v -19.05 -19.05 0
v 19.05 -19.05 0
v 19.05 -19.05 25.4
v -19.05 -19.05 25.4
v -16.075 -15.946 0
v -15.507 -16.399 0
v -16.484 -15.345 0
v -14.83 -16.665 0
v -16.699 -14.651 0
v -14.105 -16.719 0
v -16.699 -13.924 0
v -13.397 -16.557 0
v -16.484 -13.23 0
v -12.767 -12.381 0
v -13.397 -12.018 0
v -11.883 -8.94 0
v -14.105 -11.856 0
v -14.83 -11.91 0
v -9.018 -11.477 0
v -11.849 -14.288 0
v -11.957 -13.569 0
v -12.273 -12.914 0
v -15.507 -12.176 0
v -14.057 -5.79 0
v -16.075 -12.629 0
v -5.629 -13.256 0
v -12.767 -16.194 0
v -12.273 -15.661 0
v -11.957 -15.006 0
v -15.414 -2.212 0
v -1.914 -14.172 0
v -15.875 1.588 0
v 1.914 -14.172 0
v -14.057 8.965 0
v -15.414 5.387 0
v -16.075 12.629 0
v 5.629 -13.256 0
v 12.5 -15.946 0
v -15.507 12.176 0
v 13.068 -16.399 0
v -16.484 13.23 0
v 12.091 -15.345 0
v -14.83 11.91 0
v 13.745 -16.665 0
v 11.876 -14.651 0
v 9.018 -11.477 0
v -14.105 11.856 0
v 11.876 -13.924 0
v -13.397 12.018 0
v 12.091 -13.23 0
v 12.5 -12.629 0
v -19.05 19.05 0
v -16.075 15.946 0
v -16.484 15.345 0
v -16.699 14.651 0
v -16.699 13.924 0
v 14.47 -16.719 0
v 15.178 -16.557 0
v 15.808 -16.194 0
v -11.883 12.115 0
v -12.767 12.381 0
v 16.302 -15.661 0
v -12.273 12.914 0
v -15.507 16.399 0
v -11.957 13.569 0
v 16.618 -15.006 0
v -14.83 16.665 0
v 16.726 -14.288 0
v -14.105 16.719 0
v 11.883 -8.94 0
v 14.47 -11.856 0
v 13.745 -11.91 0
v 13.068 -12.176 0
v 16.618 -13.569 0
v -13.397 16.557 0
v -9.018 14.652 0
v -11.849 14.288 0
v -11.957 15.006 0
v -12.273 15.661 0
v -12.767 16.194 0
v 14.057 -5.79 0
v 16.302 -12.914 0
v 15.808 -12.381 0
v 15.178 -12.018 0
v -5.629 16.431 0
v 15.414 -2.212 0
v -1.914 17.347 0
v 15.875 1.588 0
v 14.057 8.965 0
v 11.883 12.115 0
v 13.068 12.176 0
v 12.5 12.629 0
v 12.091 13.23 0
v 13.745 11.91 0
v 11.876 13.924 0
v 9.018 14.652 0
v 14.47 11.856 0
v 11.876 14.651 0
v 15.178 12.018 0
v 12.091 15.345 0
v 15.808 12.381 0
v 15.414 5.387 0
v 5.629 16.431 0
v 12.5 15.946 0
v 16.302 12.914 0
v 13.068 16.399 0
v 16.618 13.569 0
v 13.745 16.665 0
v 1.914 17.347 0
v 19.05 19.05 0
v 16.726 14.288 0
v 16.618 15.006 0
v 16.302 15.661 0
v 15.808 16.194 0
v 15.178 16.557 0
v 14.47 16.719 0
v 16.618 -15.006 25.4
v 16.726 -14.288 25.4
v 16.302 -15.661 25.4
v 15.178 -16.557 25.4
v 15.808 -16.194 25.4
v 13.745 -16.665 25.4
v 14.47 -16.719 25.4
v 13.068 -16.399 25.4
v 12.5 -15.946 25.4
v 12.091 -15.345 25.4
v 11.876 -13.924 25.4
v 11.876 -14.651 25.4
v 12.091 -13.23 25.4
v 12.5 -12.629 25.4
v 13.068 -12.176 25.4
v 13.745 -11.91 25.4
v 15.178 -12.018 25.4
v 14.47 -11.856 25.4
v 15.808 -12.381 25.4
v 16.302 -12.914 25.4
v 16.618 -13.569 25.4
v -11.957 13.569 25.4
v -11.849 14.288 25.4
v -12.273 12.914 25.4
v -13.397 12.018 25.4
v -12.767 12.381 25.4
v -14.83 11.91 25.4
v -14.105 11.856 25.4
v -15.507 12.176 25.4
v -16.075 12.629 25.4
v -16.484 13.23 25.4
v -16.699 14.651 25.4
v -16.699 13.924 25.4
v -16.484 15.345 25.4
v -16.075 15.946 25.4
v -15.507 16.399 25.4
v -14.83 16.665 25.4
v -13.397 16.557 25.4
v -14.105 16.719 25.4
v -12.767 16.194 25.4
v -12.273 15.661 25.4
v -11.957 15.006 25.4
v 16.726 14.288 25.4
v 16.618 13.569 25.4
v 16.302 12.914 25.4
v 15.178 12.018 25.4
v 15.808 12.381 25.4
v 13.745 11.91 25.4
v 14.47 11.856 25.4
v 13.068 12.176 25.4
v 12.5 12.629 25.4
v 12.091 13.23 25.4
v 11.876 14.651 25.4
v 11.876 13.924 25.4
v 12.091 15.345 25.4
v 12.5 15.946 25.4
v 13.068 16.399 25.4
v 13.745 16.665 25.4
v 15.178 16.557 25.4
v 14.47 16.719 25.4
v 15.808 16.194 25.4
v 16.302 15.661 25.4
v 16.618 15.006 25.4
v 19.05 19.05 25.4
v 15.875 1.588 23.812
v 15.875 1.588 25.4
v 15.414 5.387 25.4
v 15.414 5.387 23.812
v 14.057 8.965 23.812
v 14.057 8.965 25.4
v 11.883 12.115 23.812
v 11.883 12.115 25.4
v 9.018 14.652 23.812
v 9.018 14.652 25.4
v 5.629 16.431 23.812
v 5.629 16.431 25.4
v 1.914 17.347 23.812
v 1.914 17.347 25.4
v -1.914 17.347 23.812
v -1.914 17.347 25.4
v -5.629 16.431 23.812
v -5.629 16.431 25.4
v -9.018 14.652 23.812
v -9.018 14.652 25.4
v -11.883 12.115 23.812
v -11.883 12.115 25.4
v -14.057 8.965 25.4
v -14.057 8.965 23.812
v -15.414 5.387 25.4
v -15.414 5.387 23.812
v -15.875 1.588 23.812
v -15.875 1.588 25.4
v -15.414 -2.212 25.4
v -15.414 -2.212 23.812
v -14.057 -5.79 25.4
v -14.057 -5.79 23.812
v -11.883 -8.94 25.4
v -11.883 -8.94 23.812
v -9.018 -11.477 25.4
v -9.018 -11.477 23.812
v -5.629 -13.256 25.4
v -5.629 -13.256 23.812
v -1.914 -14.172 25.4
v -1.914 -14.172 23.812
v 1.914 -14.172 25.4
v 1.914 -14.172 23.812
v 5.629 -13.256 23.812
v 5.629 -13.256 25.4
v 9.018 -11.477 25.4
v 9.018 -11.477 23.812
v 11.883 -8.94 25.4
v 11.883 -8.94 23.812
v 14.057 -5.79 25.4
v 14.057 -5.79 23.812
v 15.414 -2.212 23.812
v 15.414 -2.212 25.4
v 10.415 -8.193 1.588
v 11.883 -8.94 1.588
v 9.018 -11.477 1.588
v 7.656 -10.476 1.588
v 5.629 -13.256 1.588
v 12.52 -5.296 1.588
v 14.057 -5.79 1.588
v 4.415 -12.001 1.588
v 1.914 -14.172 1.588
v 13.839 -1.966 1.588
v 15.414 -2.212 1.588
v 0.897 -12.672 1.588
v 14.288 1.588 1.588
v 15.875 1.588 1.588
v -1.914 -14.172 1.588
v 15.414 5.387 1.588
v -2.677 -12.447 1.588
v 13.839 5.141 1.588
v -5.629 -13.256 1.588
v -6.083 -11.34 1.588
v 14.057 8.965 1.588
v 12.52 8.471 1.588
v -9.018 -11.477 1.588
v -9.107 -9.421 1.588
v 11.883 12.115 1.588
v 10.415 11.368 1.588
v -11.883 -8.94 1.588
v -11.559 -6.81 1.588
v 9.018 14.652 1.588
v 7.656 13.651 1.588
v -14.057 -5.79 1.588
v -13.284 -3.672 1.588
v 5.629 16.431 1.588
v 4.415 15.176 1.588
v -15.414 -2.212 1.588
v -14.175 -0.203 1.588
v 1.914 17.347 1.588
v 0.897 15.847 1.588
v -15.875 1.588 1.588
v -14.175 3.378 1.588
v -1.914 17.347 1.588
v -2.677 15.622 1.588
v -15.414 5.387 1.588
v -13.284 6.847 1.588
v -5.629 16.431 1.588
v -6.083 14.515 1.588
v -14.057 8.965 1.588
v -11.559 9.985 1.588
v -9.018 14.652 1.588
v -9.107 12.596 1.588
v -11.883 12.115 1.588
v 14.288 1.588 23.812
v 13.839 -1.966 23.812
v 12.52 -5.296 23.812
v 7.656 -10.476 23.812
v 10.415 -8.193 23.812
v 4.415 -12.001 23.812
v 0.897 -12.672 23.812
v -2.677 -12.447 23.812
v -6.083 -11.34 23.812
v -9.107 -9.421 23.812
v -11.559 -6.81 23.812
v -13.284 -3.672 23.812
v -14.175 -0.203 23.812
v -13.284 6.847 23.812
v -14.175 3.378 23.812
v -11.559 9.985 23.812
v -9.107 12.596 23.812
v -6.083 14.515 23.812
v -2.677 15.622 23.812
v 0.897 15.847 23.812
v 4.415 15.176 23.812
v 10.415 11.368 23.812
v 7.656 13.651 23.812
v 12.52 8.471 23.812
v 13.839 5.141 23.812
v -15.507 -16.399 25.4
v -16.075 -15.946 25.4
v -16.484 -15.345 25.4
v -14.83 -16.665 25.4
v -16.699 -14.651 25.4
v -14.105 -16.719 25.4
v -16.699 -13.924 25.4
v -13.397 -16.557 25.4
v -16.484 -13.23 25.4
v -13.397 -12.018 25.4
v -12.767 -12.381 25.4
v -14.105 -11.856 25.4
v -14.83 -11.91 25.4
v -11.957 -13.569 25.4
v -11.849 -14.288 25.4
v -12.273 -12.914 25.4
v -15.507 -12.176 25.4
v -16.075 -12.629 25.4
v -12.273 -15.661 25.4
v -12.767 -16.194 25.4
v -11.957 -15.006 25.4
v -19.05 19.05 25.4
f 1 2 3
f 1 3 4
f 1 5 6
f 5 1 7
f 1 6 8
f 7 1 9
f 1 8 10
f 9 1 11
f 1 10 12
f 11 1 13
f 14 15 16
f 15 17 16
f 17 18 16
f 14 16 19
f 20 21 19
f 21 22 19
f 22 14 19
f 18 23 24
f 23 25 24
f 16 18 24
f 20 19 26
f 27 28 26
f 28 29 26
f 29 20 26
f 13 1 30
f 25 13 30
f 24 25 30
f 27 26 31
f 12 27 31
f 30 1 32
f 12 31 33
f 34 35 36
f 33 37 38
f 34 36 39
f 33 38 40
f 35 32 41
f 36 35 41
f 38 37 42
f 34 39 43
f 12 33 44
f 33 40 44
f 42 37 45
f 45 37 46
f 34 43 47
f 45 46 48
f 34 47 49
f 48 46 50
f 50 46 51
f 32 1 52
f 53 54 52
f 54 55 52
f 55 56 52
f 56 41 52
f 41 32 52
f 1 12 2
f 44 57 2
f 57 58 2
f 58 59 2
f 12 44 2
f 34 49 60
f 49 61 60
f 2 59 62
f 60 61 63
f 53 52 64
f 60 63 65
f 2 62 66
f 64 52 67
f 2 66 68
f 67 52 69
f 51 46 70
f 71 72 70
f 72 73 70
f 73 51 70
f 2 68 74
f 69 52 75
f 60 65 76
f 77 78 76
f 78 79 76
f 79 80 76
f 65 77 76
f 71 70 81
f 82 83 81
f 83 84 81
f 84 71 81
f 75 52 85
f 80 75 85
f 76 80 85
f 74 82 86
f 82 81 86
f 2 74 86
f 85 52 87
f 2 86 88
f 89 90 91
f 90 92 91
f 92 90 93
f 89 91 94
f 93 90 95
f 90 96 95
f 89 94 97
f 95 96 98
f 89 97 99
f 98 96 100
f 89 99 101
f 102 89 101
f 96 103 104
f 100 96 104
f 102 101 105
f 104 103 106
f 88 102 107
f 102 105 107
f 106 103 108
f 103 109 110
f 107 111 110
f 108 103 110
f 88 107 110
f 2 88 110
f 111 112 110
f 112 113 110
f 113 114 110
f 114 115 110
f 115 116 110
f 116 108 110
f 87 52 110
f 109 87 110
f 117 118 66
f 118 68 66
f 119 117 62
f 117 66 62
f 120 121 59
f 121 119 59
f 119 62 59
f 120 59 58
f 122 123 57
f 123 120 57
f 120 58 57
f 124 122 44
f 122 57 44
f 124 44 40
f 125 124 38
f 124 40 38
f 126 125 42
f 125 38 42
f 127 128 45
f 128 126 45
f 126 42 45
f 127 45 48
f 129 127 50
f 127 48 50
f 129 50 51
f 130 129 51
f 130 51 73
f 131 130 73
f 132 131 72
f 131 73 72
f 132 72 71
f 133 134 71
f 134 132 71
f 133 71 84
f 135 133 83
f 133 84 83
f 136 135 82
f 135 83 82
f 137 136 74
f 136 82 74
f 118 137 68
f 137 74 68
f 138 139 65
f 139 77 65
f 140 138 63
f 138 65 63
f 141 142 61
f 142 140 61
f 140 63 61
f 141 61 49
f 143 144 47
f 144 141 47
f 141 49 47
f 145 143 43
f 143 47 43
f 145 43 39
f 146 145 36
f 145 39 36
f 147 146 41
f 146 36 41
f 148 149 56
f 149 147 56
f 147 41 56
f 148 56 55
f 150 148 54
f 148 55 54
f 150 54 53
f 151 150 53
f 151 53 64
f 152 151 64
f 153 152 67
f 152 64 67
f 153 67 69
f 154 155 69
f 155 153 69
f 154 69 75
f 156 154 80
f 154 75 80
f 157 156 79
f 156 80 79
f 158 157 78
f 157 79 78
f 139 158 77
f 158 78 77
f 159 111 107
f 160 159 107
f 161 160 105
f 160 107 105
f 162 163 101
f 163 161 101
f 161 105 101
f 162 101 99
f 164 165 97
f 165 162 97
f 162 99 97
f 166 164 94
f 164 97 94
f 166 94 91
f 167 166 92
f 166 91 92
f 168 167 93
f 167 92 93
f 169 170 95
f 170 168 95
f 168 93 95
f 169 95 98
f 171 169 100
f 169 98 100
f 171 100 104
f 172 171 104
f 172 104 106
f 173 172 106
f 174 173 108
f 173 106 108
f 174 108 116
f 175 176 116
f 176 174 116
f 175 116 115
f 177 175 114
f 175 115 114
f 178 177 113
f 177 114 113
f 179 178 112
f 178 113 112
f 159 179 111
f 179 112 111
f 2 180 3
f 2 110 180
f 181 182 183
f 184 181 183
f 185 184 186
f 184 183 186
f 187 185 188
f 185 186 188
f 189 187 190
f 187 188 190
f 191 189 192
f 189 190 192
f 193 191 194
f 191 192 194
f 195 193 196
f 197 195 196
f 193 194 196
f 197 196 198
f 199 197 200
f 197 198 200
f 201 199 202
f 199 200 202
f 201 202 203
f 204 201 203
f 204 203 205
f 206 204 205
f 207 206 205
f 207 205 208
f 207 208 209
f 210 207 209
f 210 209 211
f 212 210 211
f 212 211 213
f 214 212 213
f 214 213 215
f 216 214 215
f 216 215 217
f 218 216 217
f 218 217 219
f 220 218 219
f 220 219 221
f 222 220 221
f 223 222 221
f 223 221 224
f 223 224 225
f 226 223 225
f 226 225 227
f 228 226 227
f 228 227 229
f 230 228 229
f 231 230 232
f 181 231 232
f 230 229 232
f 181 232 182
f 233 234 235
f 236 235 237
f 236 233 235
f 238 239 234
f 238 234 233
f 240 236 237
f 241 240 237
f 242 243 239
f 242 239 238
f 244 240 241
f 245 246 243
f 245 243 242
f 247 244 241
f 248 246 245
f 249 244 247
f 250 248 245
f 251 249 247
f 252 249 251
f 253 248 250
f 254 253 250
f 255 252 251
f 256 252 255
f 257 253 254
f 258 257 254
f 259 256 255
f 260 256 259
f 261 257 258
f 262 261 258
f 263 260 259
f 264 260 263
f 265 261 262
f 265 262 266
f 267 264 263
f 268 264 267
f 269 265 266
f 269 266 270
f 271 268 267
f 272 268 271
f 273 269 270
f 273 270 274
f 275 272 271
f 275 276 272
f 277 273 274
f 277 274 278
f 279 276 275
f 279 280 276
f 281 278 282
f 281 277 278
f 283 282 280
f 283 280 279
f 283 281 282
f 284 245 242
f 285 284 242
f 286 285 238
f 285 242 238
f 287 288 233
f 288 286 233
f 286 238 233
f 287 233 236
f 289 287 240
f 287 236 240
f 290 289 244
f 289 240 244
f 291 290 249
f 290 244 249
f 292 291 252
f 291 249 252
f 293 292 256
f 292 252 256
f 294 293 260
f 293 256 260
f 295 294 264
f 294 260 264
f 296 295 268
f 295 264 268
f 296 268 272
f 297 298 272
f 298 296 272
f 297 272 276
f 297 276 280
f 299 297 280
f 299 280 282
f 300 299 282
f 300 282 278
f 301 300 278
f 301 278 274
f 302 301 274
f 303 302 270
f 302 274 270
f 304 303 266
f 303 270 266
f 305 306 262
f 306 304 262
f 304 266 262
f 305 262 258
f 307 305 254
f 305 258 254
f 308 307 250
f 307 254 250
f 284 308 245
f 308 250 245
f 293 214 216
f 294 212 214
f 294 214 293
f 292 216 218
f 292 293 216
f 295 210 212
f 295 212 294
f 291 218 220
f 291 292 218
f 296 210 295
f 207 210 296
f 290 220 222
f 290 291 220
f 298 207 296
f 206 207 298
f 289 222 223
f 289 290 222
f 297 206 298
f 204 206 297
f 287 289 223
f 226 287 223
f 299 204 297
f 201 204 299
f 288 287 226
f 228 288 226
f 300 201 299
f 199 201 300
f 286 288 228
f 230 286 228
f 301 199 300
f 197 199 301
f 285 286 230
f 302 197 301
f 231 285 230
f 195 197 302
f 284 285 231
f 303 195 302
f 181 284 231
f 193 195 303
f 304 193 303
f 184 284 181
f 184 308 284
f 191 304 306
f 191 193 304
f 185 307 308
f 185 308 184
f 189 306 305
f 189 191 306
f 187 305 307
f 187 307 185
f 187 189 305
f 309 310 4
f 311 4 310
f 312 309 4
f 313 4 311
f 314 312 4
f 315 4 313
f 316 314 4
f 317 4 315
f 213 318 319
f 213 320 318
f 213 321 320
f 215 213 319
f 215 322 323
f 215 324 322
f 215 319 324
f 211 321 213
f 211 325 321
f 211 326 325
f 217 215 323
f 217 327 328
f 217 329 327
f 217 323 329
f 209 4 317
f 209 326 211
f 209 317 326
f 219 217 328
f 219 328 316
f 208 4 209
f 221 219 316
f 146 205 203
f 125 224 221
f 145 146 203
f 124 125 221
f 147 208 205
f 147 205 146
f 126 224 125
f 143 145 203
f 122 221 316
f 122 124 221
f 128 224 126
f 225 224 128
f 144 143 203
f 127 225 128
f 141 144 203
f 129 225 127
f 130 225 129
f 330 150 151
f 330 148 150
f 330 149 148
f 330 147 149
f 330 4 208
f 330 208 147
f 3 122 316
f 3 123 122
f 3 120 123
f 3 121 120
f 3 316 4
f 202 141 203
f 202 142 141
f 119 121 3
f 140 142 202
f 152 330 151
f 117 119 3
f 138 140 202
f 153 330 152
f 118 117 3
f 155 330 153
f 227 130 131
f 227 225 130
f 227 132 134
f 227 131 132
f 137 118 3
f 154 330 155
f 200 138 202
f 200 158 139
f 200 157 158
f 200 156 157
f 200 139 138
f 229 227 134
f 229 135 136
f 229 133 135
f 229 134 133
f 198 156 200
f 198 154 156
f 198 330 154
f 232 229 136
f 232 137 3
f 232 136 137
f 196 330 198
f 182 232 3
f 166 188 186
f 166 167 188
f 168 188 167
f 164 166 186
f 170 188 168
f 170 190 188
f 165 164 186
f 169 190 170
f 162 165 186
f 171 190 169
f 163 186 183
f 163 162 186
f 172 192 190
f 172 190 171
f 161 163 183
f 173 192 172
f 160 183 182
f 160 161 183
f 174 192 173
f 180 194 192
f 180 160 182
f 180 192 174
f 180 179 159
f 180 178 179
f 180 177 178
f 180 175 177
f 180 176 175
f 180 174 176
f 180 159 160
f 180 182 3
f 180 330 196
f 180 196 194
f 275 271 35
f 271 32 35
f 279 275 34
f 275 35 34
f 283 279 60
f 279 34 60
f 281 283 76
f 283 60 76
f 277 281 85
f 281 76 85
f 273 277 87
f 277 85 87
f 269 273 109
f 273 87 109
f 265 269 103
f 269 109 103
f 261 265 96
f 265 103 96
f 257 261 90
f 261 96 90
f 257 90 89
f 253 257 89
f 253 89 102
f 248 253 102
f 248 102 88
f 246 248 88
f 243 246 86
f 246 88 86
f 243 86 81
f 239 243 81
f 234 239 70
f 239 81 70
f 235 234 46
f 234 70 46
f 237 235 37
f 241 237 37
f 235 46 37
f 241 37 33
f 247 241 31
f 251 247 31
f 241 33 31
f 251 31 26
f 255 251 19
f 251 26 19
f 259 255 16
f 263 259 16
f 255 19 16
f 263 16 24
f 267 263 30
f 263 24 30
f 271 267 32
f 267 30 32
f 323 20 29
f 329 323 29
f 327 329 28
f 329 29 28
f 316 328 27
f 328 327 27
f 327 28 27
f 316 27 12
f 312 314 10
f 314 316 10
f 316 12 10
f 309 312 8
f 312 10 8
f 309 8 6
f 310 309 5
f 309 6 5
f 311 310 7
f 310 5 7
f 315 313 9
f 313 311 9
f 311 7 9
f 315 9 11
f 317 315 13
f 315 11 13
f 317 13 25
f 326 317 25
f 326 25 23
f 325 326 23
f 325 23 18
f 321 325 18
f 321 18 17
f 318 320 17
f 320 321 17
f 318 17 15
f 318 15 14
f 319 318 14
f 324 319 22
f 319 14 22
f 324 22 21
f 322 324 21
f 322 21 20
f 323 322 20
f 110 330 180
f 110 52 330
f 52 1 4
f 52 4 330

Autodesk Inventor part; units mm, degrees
ref_plane "YZ Plane" through (0, 0, 0) normal (1, 0, 0) x (0, 1, 0)
ref_plane "XZ Plane" through (0, 0, 0) normal (0, 1, 0) x (-1, 0, 0)
ref_plane "XY Plane" through (0, 0, 0) normal (0, 0, 1) x (1, 0, 0)
sketch "Sketch1" plane through (0, 0, 0) normal (0, 0, 1) x (1, 0, 0)
  line L0 (-19.05, 19.05) -> (19.05, 19.05)
  line L1 (19.05, 19.05) -> (19.05, -19.05)
  line L2 (19.05, -19.05) -> (-19.05, -19.05)
  line L3 (-19.05, -19.05) -> (-19.05, 19.05)
  circle A0 centre (-14.2875, 14.2875) radius 2.4384
  circle A1 centre (14.2875, 14.2875) radius 2.4384
  circle A2 centre (14.2875, -14.2875) radius 2.4384
  circle A3 centre (-14.2875, -14.2875) radius 2.4384
  line L4 (-19.05, 15.875) -> (19.05, 15.875) construction
  line L5 (14.2875, 19.05) -> (14.2875, -19.05) construction
  line L6 (19.05, -12.7) -> (-19.05, -12.7) construction
  line L7 (-14.2875, -19.05) -> (-14.2875, 19.05) construction
  circle A4 centre (0, 1.5875) radius 14.2875
  point P0 (0, 0)
  dimension "d2" = 38.1
  dimension "d4" = 38.1
  dimension "d5" = 4.8768
  dimension "d6" = 4.7625
  dimension "d7" = 4.7625
  dimension "d8" = 4.7625
  dimension "d9" = 4.7625
  dimension "d10" = 4.7625
  dimension "d11" = 4.7625
  dimension "d12" = 4.7625
  dimension "d13" = 4.7625
  dimension "d22" = 19.05
  dimension "d23" = 6.35
extrude "Extrusion4" add sketch "Sketch1" along normal blind 25.4
sketch "Sketch4" plane through (0, 0, 25.4) normal (0, 0, 1) x (1, 0, 0)
  circle A0 centre (0, 1.5875) radius 14.2875 projected
  circle A1 centre (0, 1.5875) radius 15.875
  circle A2 centre (0, 1.5875) radius 14.2875
  point P0 (0, 0)
  dimension "d26" = 1.5875
extrude "Extrusion5" cut sketch "Sketch4" against normal blind 1.5875
sketch "Sketch5" plane through (0, 0, 0) normal (0, 0, -1) x (-1, 0, 0)
  circle A0 centre (0, 1.5875) radius 14.2875 projected
  circle A1 centre (0, 1.5875) radius 15.875
  circle A2 centre (0, 1.5875) radius 14.2875
  point P0 (0, 0)
  dimension "d29" = 1.5875
extrude "Extrusion6" cut sketch "Sketch5" against normal blind 1.5875
properties part number "WheelBearingBlock" material "Aluminum-6061"
